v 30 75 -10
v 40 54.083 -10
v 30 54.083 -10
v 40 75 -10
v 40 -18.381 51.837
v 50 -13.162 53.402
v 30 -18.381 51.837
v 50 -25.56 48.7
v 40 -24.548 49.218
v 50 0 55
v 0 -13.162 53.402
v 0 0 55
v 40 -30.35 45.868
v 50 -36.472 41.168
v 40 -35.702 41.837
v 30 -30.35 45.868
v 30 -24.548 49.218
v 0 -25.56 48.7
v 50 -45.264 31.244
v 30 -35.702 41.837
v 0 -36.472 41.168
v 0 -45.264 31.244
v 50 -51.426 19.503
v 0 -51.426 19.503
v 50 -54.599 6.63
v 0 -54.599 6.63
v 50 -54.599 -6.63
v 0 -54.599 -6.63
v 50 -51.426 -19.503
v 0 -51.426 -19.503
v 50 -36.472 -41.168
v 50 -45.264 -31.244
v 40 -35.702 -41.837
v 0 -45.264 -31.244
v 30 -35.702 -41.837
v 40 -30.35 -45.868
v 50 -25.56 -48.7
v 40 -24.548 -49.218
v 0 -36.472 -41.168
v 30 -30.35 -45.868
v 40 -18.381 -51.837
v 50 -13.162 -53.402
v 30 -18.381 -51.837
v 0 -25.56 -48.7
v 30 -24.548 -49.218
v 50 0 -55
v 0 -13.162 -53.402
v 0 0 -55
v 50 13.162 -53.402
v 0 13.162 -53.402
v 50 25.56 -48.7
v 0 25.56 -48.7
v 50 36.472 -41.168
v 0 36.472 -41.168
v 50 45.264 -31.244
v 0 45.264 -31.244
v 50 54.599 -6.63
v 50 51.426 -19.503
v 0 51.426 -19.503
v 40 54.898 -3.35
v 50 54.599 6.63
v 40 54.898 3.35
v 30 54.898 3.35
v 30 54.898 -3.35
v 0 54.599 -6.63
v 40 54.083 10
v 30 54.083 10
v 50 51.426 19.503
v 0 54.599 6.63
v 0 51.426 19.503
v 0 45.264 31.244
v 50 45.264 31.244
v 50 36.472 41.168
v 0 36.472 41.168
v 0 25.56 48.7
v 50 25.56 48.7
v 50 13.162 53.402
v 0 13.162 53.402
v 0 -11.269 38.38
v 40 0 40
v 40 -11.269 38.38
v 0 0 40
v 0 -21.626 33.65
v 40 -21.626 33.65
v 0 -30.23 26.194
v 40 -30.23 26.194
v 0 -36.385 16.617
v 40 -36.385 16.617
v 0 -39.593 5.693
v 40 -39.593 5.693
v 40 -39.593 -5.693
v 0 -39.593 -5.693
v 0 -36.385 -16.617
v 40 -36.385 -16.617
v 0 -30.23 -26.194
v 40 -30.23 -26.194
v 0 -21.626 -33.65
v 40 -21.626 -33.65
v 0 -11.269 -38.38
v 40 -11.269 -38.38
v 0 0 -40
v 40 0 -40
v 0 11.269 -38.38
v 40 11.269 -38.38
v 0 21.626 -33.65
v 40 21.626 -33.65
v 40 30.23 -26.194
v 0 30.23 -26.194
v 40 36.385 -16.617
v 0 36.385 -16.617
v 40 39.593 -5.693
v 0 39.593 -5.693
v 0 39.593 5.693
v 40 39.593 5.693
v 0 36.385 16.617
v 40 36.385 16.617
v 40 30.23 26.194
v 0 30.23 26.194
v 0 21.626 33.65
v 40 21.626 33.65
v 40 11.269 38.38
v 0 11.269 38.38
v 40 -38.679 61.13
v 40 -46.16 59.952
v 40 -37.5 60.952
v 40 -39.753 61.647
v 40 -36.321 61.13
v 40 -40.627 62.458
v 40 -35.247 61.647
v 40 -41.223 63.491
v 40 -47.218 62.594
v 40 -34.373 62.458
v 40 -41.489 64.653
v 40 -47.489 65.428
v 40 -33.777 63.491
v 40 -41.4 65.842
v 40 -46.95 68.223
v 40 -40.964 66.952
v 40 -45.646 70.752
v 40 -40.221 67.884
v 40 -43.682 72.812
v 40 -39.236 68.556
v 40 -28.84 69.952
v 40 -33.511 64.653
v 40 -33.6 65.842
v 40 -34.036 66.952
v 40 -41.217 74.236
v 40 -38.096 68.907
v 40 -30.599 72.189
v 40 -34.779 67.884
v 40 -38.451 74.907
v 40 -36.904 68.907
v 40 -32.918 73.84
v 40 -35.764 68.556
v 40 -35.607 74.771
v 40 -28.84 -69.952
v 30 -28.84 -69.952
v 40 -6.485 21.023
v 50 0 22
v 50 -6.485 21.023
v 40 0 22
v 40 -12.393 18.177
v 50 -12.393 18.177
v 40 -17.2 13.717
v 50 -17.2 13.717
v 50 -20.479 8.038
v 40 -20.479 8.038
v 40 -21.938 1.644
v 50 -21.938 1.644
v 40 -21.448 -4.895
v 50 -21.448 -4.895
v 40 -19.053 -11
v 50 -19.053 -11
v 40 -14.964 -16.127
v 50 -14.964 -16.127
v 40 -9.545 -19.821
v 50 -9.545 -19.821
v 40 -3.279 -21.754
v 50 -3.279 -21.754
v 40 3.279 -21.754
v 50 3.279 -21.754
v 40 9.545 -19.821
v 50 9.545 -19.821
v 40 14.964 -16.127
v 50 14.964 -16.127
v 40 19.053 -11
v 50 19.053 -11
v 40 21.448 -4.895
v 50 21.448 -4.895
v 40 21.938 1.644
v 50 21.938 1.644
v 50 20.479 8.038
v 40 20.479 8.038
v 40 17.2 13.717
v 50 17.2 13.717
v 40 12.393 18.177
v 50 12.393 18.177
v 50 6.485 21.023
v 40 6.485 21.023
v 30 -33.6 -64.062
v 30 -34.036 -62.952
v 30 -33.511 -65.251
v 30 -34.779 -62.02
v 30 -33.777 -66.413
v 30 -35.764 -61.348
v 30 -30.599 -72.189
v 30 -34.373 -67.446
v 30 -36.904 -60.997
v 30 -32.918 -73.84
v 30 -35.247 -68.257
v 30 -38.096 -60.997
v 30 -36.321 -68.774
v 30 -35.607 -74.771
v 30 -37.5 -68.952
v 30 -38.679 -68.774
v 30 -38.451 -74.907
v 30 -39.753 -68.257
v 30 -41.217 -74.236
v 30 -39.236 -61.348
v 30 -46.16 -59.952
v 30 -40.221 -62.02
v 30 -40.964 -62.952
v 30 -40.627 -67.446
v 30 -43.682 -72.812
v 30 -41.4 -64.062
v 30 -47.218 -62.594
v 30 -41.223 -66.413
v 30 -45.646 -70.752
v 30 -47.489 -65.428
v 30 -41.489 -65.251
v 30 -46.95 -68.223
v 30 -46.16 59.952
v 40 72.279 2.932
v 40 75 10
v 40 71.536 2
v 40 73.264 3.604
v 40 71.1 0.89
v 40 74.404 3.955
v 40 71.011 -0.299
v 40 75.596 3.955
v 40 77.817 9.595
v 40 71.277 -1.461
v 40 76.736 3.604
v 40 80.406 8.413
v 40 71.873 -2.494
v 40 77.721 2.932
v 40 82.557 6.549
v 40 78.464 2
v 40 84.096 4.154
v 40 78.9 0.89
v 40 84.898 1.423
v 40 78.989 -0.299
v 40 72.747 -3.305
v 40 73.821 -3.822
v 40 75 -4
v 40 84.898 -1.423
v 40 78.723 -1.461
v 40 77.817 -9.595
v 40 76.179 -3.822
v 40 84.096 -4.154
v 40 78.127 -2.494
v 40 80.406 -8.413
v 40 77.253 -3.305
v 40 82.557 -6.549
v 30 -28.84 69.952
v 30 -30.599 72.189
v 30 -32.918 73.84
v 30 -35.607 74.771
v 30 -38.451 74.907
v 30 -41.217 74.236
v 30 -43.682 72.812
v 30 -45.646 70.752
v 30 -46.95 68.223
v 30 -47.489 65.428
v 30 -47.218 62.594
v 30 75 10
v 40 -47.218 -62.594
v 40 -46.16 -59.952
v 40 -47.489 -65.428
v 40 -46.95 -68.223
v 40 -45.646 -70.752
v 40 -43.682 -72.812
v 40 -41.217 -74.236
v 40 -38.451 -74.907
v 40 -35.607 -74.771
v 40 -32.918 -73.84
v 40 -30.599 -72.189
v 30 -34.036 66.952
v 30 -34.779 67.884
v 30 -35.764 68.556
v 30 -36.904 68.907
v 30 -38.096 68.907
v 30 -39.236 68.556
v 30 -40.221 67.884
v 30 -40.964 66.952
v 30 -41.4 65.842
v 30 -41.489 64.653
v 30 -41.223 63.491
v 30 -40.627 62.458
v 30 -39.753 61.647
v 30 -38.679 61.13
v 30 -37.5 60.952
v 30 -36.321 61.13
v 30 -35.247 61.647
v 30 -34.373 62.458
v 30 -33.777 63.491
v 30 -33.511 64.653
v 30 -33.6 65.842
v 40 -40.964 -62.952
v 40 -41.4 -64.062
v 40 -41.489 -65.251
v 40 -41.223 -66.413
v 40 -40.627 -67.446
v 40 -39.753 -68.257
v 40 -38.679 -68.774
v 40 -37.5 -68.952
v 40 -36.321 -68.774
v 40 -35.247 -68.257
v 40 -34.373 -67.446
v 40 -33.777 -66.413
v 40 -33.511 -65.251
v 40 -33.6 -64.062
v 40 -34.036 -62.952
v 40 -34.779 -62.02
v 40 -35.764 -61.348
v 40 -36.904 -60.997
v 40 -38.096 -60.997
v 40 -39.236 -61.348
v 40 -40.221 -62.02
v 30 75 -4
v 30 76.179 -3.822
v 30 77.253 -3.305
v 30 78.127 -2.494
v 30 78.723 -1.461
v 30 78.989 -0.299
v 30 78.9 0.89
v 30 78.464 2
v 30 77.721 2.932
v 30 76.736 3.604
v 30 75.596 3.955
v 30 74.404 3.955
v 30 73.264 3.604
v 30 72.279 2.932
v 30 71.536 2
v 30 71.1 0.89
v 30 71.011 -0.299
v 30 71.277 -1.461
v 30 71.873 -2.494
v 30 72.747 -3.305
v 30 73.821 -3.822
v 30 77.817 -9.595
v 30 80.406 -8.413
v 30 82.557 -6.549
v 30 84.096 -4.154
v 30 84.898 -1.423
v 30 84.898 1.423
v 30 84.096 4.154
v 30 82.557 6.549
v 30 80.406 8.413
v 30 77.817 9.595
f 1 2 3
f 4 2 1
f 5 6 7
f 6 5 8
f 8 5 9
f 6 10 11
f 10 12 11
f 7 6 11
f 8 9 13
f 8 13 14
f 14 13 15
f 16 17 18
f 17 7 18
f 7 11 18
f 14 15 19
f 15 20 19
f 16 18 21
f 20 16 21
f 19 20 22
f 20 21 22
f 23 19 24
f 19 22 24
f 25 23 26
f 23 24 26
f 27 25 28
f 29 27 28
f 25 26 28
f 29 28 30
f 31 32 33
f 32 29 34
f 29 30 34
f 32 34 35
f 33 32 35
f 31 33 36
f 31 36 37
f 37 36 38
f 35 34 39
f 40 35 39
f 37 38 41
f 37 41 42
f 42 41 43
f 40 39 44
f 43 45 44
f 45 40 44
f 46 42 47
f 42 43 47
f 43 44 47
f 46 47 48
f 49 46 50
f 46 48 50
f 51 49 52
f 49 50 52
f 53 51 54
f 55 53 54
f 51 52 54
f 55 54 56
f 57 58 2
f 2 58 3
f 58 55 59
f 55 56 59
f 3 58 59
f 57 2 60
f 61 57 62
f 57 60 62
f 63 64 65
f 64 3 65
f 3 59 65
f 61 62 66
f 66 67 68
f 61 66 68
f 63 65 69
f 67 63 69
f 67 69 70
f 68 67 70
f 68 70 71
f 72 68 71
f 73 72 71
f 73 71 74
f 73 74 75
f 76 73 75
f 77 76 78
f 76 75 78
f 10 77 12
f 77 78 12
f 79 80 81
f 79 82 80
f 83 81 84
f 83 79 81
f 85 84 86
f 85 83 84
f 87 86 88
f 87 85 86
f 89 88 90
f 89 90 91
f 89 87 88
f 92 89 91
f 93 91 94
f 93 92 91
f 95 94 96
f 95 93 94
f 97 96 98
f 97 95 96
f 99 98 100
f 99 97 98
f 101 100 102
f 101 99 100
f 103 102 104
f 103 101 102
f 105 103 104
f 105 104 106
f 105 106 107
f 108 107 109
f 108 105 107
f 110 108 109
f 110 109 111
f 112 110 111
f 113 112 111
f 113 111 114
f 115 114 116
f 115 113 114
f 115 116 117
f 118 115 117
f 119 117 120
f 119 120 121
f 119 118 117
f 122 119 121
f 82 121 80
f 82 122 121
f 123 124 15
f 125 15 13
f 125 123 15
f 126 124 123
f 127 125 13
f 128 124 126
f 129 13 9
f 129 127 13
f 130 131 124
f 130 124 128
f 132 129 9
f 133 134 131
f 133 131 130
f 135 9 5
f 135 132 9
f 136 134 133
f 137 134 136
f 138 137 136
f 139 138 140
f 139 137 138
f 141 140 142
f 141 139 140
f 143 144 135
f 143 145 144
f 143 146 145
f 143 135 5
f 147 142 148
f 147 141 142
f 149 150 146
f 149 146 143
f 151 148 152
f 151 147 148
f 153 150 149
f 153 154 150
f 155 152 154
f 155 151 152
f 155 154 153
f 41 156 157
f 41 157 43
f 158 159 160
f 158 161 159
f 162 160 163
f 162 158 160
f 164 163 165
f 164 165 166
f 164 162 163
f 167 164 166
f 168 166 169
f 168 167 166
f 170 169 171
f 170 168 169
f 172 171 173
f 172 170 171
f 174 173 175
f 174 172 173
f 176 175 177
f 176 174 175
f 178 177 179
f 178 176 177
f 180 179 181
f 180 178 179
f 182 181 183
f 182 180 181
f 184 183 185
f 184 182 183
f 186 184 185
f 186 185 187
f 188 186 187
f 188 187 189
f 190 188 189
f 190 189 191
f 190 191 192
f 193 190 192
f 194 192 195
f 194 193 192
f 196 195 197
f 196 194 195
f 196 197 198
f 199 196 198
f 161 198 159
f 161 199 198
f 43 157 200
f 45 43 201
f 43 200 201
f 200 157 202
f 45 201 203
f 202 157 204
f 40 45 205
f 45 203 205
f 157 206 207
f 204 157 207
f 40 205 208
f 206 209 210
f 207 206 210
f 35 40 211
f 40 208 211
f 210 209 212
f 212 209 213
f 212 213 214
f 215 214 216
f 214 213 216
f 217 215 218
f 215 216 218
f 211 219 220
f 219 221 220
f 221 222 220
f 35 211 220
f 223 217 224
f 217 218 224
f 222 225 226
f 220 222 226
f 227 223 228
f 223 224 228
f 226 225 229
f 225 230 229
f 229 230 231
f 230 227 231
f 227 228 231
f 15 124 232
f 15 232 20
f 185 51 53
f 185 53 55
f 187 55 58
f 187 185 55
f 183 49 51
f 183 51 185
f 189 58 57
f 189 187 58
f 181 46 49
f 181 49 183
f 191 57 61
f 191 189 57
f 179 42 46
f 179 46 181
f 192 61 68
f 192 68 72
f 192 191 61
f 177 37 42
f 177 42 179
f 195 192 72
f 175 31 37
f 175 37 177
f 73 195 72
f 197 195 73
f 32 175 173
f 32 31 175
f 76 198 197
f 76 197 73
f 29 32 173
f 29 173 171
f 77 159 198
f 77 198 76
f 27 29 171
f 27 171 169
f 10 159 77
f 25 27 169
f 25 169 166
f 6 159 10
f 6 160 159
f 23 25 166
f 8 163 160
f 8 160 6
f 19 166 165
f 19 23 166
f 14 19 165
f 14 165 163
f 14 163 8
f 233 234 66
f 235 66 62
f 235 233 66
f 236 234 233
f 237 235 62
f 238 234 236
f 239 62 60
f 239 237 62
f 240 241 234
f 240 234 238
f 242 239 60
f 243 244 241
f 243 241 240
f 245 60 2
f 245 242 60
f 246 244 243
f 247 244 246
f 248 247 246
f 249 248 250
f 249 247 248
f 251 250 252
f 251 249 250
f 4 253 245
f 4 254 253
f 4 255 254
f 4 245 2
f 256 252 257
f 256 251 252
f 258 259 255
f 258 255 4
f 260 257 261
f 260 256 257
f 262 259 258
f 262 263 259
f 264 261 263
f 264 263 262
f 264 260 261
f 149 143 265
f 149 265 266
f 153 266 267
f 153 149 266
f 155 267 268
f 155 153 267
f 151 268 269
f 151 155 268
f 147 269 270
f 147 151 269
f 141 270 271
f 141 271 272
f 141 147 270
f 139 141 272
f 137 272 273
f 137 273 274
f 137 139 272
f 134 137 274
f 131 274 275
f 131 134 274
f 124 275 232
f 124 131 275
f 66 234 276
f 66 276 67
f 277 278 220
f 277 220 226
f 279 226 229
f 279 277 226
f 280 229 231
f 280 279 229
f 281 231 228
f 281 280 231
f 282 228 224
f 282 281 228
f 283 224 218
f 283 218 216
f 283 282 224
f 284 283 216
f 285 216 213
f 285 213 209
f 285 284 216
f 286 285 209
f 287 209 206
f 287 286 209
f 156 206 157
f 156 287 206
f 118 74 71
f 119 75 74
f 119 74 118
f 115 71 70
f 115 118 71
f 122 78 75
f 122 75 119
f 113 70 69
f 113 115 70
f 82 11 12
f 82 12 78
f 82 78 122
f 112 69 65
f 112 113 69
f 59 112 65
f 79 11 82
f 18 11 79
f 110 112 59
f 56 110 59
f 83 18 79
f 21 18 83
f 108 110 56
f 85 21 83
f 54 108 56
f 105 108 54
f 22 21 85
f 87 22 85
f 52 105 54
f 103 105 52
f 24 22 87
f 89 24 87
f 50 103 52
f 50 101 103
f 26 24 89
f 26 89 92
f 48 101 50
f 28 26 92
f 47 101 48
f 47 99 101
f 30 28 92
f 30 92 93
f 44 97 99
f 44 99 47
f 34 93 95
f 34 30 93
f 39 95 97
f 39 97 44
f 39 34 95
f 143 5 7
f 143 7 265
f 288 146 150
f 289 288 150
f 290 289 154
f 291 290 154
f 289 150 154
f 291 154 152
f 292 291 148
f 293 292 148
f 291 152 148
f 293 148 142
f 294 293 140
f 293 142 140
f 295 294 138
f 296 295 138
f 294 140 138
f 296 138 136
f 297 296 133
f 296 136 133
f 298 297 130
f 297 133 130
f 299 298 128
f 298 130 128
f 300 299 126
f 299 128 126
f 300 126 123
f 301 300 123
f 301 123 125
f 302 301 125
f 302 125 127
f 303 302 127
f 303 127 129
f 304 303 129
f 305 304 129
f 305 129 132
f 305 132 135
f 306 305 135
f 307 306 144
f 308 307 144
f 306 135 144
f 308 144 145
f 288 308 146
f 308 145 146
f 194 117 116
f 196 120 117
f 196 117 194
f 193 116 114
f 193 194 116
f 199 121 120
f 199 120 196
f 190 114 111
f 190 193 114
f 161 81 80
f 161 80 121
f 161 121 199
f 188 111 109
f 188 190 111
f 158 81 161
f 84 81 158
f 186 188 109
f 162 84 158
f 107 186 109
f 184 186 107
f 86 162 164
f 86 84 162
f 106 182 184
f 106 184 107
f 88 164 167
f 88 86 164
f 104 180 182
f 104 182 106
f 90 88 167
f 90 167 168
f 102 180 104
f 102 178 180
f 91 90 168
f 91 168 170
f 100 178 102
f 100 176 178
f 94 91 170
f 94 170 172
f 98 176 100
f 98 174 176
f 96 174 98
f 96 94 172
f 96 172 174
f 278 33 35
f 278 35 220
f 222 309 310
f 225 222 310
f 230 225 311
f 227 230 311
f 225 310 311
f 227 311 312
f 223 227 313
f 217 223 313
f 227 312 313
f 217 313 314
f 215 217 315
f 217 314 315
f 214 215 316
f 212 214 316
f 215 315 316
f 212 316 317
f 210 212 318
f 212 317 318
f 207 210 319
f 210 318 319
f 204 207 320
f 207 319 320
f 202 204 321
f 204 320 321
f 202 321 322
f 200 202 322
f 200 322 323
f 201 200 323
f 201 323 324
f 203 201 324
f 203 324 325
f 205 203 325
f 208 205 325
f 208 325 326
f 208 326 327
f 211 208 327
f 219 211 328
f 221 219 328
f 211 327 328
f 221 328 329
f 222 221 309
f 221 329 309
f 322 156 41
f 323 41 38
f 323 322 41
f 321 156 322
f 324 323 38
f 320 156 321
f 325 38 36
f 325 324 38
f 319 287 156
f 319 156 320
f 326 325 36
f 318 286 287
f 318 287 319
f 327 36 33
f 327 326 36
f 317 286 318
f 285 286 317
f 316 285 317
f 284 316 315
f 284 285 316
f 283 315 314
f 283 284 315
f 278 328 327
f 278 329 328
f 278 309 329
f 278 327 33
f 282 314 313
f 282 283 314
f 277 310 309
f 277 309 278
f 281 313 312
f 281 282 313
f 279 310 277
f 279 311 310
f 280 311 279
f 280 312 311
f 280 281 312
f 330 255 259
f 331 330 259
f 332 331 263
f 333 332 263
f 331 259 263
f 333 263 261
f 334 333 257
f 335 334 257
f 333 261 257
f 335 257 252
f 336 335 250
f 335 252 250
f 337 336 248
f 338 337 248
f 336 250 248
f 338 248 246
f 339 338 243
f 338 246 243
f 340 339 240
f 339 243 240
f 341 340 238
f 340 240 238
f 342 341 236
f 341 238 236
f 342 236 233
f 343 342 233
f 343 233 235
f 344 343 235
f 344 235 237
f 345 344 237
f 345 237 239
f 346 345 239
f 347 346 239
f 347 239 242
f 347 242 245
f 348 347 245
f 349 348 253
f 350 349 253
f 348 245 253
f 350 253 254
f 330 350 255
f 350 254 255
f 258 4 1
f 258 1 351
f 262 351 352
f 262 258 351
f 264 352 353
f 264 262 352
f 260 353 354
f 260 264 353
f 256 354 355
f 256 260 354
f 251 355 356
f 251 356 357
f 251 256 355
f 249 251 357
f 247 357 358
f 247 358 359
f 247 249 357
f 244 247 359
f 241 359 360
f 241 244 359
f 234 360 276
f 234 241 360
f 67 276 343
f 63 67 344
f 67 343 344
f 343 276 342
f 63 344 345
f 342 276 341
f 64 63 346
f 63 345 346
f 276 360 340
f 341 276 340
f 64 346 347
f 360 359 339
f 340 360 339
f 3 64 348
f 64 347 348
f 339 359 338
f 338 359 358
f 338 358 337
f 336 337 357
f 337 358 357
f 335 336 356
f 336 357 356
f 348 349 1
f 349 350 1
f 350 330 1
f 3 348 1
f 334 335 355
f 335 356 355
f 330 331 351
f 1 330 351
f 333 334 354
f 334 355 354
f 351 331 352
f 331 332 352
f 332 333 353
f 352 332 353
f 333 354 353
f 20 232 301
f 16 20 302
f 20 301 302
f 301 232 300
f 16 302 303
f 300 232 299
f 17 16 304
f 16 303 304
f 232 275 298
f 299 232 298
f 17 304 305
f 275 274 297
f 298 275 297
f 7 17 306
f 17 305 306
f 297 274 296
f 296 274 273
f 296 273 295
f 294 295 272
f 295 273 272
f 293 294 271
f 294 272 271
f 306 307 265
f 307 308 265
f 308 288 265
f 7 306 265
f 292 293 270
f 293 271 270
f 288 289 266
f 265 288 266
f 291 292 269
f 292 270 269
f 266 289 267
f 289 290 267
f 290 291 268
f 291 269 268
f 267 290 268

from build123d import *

# Parameters (mm, degrees)
BOSS_EXTRUDE1_START = -15
SKETCH4_R           = 4
BOSS_EXTRUDE1_DEPTH = 10
CIRPATTERN1_COUNT   = 3
SKETCH7_R           = 55
SKETCH7_R_2         = 22
CUT_EXTRUDE1_DEPTH  = 5


with BuildPart() as part:
    # Sketch3 → Revolve1 (revolve)
    with BuildSketch(Plane.XY, mode=Mode.PRIVATE) as revolve1_sk:
        Polygon((0, 40), (0, 55), (50, 55), (55, 55), (55, 52), (55, 22), (40, 22), (40, 40), align=None)
    revolve(revolve1_sk.sketch.rotate(Axis((-32.450781709, 0, 0), (1, 0, 0)), 90), axis=Axis((-32.450781709, 0, 0), (1, 0, 0)))

    # Sketch4 → Boss-Extrude1 (add)
    with BuildSketch(Plane(origin=(55, 0, 0), x_dir=(0, 0, -1), z_dir=(1, 0, 0)).offset(BOSS_EXTRUDE1_START)):
        with BuildLine():
            Line((10, 51.100551248), (10, 75))
            ThreePointArc((10, 75), (0, 85), (-10, 75))
            Line((-10, 75), (-10, 51.100551248))
            Line((-10, 51.100551248), (10, 51.100551248))
        make_face()
        with Locations((0, 75)):
            Circle(SKETCH4_R, mode=Mode.SUBTRACT)
    boss_extrude1 = extrude(amount=-BOSS_EXTRUDE1_DEPTH)

    # CirPattern1: Boss-Extrude1 ×3 about axis
    cirpattern1_axis = Axis((0, 0, 0), (1, 0, 0))
    for i in range(1, CIRPATTERN1_COUNT):
        add(boss_extrude1.rotate(cirpattern1_axis, i * 360 / CIRPATTERN1_COUNT))

    # Sketch7 → Cut-Extrude1 (cut)
    with BuildSketch(Plane(origin=(55, 0, 0), x_dir=(0, 0, -1), z_dir=(1, 0, 0))):
        with Locations(Location((0, 0, 0), (0, 0, 180))):
            Circle(SKETCH7_R)
        with Locations(Location((0, 0, 0), (0, 0, 180))):
            Circle(SKETCH7_R_2, mode=Mode.SUBTRACT)
    extrude(amount=-CUT_EXTRUDE1_DEPTH, mode=Mode.SUBTRACT)


solid = part.part
